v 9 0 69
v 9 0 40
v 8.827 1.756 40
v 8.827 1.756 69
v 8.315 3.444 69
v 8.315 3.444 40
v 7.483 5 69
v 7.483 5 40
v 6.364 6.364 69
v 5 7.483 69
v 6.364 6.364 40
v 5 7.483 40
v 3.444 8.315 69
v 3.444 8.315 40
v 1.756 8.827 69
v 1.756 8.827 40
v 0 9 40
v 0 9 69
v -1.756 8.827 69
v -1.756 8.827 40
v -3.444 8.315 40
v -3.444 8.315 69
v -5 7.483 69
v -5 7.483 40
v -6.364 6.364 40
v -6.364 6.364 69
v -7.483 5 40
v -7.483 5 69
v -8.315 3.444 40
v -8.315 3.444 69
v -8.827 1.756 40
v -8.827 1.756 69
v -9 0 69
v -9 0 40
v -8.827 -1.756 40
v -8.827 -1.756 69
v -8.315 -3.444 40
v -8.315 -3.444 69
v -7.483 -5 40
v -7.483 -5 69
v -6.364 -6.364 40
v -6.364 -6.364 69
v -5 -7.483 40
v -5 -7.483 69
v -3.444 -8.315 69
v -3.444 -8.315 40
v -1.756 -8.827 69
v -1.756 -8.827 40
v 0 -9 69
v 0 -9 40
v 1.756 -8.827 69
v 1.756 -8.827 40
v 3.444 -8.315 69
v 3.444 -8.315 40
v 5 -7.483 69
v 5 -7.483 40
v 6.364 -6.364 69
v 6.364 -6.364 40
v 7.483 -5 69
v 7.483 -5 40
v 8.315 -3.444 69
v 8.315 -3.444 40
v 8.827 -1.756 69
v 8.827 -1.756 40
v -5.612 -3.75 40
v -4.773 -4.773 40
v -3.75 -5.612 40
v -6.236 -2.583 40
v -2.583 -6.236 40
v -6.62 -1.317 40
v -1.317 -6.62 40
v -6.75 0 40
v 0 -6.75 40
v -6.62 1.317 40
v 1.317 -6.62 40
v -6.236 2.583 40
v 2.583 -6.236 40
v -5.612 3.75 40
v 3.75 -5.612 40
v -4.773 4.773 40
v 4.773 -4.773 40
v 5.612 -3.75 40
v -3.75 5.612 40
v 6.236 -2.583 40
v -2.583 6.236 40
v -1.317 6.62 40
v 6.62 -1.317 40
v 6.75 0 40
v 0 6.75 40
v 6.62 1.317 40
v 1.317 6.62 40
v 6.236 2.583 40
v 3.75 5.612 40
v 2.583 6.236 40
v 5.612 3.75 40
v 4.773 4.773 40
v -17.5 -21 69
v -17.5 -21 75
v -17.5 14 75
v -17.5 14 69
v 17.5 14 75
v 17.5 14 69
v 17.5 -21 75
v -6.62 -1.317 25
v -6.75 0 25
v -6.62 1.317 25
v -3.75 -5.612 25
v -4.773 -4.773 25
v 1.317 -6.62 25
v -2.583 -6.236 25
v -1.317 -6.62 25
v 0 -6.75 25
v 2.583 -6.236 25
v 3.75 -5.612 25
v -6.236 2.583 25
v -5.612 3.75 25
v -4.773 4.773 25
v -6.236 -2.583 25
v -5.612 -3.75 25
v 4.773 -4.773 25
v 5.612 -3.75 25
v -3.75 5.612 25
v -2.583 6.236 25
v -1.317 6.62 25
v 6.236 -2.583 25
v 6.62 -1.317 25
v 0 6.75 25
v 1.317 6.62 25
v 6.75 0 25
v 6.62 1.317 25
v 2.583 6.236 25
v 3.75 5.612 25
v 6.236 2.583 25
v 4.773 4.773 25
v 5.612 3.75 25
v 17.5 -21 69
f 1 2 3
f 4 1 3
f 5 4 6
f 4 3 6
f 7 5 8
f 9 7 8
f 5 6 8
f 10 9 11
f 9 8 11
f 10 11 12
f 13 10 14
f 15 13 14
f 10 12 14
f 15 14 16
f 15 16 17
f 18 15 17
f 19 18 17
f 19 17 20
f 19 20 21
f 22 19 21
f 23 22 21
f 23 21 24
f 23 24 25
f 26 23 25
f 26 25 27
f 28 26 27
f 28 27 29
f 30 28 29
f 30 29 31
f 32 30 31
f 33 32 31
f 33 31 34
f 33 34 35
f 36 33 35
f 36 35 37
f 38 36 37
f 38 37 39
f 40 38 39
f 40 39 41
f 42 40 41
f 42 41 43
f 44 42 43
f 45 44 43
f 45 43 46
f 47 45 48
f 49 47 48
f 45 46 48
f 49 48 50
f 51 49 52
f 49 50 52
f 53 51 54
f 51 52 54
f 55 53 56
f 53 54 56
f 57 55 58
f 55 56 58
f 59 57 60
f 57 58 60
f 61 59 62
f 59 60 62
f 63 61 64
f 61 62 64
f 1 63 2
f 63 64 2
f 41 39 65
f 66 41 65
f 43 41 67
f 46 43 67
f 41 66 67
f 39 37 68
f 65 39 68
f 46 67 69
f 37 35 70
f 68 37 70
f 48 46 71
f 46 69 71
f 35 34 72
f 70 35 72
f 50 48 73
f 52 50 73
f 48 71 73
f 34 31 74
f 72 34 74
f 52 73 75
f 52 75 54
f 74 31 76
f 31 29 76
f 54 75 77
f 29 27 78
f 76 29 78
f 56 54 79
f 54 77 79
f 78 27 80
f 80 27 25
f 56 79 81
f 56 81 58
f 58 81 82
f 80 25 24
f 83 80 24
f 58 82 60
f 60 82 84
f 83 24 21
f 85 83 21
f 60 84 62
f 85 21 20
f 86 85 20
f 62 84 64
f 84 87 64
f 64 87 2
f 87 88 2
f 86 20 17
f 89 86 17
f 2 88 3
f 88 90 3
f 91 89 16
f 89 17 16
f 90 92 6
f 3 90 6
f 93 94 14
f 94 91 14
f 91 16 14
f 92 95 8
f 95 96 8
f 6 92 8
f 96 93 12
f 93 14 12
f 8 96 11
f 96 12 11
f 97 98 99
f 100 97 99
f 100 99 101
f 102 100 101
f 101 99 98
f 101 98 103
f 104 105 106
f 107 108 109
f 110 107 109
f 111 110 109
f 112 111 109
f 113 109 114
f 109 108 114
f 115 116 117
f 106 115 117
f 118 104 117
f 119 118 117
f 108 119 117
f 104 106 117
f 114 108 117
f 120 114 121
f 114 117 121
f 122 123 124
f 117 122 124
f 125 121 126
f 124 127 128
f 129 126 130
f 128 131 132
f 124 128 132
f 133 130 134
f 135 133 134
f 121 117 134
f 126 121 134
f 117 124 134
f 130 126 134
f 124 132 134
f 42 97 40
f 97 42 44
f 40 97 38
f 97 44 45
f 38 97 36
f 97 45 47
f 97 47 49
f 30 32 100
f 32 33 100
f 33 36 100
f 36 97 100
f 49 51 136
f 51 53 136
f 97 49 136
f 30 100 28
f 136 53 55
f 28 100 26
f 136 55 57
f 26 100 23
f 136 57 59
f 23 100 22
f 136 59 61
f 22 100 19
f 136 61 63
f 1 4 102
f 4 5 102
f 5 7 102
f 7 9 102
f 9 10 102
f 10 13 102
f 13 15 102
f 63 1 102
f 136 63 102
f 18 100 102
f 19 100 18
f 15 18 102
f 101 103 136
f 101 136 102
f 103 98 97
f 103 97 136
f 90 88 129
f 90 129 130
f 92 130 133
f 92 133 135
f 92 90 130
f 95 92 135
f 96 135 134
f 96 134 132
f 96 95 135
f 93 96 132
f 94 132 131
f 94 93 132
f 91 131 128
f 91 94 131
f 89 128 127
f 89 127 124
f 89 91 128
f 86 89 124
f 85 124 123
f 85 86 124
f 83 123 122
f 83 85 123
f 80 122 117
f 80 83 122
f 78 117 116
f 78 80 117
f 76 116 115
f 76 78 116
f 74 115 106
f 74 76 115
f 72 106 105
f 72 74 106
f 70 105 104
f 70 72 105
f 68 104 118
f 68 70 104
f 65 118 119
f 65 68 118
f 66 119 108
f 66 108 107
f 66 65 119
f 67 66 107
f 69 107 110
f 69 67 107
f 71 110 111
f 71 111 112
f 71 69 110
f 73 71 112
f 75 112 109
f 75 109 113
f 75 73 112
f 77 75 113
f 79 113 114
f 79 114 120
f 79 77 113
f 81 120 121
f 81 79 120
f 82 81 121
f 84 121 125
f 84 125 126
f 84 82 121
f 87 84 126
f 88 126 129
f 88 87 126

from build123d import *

# Parameters (mm, degrees)
F1_R     = 6.75
F2_DEPTH = 15
F3_R     = 9
F4_DEPTH = 35
F5_W     = 35
F5_H     = 35
F5_R     = 9
F6_DEPTH = 6


with BuildPart() as f2:
    # F1 (on offset) → F2 (new body)
    with BuildSketch(Plane.XY.offset(40)):
        Circle(F1_R)
    extrude(amount=-F2_DEPTH)

    # F3 (on offset) → F4 (join)
    with BuildSketch(Plane.XY.offset(40)):
        Circle(F3_R)
    extrude(amount=F4_DEPTH)

    # F5 (on face) → F6 (join)
    with BuildSketch(Plane.XY.offset(75)):
        with Locations((0, -3.5)):
            Rectangle(F5_W, F5_H)
        Circle(F5_R, mode=Mode.SUBTRACT)
    extrude(amount=-F6_DEPTH)


solid = f2.part
